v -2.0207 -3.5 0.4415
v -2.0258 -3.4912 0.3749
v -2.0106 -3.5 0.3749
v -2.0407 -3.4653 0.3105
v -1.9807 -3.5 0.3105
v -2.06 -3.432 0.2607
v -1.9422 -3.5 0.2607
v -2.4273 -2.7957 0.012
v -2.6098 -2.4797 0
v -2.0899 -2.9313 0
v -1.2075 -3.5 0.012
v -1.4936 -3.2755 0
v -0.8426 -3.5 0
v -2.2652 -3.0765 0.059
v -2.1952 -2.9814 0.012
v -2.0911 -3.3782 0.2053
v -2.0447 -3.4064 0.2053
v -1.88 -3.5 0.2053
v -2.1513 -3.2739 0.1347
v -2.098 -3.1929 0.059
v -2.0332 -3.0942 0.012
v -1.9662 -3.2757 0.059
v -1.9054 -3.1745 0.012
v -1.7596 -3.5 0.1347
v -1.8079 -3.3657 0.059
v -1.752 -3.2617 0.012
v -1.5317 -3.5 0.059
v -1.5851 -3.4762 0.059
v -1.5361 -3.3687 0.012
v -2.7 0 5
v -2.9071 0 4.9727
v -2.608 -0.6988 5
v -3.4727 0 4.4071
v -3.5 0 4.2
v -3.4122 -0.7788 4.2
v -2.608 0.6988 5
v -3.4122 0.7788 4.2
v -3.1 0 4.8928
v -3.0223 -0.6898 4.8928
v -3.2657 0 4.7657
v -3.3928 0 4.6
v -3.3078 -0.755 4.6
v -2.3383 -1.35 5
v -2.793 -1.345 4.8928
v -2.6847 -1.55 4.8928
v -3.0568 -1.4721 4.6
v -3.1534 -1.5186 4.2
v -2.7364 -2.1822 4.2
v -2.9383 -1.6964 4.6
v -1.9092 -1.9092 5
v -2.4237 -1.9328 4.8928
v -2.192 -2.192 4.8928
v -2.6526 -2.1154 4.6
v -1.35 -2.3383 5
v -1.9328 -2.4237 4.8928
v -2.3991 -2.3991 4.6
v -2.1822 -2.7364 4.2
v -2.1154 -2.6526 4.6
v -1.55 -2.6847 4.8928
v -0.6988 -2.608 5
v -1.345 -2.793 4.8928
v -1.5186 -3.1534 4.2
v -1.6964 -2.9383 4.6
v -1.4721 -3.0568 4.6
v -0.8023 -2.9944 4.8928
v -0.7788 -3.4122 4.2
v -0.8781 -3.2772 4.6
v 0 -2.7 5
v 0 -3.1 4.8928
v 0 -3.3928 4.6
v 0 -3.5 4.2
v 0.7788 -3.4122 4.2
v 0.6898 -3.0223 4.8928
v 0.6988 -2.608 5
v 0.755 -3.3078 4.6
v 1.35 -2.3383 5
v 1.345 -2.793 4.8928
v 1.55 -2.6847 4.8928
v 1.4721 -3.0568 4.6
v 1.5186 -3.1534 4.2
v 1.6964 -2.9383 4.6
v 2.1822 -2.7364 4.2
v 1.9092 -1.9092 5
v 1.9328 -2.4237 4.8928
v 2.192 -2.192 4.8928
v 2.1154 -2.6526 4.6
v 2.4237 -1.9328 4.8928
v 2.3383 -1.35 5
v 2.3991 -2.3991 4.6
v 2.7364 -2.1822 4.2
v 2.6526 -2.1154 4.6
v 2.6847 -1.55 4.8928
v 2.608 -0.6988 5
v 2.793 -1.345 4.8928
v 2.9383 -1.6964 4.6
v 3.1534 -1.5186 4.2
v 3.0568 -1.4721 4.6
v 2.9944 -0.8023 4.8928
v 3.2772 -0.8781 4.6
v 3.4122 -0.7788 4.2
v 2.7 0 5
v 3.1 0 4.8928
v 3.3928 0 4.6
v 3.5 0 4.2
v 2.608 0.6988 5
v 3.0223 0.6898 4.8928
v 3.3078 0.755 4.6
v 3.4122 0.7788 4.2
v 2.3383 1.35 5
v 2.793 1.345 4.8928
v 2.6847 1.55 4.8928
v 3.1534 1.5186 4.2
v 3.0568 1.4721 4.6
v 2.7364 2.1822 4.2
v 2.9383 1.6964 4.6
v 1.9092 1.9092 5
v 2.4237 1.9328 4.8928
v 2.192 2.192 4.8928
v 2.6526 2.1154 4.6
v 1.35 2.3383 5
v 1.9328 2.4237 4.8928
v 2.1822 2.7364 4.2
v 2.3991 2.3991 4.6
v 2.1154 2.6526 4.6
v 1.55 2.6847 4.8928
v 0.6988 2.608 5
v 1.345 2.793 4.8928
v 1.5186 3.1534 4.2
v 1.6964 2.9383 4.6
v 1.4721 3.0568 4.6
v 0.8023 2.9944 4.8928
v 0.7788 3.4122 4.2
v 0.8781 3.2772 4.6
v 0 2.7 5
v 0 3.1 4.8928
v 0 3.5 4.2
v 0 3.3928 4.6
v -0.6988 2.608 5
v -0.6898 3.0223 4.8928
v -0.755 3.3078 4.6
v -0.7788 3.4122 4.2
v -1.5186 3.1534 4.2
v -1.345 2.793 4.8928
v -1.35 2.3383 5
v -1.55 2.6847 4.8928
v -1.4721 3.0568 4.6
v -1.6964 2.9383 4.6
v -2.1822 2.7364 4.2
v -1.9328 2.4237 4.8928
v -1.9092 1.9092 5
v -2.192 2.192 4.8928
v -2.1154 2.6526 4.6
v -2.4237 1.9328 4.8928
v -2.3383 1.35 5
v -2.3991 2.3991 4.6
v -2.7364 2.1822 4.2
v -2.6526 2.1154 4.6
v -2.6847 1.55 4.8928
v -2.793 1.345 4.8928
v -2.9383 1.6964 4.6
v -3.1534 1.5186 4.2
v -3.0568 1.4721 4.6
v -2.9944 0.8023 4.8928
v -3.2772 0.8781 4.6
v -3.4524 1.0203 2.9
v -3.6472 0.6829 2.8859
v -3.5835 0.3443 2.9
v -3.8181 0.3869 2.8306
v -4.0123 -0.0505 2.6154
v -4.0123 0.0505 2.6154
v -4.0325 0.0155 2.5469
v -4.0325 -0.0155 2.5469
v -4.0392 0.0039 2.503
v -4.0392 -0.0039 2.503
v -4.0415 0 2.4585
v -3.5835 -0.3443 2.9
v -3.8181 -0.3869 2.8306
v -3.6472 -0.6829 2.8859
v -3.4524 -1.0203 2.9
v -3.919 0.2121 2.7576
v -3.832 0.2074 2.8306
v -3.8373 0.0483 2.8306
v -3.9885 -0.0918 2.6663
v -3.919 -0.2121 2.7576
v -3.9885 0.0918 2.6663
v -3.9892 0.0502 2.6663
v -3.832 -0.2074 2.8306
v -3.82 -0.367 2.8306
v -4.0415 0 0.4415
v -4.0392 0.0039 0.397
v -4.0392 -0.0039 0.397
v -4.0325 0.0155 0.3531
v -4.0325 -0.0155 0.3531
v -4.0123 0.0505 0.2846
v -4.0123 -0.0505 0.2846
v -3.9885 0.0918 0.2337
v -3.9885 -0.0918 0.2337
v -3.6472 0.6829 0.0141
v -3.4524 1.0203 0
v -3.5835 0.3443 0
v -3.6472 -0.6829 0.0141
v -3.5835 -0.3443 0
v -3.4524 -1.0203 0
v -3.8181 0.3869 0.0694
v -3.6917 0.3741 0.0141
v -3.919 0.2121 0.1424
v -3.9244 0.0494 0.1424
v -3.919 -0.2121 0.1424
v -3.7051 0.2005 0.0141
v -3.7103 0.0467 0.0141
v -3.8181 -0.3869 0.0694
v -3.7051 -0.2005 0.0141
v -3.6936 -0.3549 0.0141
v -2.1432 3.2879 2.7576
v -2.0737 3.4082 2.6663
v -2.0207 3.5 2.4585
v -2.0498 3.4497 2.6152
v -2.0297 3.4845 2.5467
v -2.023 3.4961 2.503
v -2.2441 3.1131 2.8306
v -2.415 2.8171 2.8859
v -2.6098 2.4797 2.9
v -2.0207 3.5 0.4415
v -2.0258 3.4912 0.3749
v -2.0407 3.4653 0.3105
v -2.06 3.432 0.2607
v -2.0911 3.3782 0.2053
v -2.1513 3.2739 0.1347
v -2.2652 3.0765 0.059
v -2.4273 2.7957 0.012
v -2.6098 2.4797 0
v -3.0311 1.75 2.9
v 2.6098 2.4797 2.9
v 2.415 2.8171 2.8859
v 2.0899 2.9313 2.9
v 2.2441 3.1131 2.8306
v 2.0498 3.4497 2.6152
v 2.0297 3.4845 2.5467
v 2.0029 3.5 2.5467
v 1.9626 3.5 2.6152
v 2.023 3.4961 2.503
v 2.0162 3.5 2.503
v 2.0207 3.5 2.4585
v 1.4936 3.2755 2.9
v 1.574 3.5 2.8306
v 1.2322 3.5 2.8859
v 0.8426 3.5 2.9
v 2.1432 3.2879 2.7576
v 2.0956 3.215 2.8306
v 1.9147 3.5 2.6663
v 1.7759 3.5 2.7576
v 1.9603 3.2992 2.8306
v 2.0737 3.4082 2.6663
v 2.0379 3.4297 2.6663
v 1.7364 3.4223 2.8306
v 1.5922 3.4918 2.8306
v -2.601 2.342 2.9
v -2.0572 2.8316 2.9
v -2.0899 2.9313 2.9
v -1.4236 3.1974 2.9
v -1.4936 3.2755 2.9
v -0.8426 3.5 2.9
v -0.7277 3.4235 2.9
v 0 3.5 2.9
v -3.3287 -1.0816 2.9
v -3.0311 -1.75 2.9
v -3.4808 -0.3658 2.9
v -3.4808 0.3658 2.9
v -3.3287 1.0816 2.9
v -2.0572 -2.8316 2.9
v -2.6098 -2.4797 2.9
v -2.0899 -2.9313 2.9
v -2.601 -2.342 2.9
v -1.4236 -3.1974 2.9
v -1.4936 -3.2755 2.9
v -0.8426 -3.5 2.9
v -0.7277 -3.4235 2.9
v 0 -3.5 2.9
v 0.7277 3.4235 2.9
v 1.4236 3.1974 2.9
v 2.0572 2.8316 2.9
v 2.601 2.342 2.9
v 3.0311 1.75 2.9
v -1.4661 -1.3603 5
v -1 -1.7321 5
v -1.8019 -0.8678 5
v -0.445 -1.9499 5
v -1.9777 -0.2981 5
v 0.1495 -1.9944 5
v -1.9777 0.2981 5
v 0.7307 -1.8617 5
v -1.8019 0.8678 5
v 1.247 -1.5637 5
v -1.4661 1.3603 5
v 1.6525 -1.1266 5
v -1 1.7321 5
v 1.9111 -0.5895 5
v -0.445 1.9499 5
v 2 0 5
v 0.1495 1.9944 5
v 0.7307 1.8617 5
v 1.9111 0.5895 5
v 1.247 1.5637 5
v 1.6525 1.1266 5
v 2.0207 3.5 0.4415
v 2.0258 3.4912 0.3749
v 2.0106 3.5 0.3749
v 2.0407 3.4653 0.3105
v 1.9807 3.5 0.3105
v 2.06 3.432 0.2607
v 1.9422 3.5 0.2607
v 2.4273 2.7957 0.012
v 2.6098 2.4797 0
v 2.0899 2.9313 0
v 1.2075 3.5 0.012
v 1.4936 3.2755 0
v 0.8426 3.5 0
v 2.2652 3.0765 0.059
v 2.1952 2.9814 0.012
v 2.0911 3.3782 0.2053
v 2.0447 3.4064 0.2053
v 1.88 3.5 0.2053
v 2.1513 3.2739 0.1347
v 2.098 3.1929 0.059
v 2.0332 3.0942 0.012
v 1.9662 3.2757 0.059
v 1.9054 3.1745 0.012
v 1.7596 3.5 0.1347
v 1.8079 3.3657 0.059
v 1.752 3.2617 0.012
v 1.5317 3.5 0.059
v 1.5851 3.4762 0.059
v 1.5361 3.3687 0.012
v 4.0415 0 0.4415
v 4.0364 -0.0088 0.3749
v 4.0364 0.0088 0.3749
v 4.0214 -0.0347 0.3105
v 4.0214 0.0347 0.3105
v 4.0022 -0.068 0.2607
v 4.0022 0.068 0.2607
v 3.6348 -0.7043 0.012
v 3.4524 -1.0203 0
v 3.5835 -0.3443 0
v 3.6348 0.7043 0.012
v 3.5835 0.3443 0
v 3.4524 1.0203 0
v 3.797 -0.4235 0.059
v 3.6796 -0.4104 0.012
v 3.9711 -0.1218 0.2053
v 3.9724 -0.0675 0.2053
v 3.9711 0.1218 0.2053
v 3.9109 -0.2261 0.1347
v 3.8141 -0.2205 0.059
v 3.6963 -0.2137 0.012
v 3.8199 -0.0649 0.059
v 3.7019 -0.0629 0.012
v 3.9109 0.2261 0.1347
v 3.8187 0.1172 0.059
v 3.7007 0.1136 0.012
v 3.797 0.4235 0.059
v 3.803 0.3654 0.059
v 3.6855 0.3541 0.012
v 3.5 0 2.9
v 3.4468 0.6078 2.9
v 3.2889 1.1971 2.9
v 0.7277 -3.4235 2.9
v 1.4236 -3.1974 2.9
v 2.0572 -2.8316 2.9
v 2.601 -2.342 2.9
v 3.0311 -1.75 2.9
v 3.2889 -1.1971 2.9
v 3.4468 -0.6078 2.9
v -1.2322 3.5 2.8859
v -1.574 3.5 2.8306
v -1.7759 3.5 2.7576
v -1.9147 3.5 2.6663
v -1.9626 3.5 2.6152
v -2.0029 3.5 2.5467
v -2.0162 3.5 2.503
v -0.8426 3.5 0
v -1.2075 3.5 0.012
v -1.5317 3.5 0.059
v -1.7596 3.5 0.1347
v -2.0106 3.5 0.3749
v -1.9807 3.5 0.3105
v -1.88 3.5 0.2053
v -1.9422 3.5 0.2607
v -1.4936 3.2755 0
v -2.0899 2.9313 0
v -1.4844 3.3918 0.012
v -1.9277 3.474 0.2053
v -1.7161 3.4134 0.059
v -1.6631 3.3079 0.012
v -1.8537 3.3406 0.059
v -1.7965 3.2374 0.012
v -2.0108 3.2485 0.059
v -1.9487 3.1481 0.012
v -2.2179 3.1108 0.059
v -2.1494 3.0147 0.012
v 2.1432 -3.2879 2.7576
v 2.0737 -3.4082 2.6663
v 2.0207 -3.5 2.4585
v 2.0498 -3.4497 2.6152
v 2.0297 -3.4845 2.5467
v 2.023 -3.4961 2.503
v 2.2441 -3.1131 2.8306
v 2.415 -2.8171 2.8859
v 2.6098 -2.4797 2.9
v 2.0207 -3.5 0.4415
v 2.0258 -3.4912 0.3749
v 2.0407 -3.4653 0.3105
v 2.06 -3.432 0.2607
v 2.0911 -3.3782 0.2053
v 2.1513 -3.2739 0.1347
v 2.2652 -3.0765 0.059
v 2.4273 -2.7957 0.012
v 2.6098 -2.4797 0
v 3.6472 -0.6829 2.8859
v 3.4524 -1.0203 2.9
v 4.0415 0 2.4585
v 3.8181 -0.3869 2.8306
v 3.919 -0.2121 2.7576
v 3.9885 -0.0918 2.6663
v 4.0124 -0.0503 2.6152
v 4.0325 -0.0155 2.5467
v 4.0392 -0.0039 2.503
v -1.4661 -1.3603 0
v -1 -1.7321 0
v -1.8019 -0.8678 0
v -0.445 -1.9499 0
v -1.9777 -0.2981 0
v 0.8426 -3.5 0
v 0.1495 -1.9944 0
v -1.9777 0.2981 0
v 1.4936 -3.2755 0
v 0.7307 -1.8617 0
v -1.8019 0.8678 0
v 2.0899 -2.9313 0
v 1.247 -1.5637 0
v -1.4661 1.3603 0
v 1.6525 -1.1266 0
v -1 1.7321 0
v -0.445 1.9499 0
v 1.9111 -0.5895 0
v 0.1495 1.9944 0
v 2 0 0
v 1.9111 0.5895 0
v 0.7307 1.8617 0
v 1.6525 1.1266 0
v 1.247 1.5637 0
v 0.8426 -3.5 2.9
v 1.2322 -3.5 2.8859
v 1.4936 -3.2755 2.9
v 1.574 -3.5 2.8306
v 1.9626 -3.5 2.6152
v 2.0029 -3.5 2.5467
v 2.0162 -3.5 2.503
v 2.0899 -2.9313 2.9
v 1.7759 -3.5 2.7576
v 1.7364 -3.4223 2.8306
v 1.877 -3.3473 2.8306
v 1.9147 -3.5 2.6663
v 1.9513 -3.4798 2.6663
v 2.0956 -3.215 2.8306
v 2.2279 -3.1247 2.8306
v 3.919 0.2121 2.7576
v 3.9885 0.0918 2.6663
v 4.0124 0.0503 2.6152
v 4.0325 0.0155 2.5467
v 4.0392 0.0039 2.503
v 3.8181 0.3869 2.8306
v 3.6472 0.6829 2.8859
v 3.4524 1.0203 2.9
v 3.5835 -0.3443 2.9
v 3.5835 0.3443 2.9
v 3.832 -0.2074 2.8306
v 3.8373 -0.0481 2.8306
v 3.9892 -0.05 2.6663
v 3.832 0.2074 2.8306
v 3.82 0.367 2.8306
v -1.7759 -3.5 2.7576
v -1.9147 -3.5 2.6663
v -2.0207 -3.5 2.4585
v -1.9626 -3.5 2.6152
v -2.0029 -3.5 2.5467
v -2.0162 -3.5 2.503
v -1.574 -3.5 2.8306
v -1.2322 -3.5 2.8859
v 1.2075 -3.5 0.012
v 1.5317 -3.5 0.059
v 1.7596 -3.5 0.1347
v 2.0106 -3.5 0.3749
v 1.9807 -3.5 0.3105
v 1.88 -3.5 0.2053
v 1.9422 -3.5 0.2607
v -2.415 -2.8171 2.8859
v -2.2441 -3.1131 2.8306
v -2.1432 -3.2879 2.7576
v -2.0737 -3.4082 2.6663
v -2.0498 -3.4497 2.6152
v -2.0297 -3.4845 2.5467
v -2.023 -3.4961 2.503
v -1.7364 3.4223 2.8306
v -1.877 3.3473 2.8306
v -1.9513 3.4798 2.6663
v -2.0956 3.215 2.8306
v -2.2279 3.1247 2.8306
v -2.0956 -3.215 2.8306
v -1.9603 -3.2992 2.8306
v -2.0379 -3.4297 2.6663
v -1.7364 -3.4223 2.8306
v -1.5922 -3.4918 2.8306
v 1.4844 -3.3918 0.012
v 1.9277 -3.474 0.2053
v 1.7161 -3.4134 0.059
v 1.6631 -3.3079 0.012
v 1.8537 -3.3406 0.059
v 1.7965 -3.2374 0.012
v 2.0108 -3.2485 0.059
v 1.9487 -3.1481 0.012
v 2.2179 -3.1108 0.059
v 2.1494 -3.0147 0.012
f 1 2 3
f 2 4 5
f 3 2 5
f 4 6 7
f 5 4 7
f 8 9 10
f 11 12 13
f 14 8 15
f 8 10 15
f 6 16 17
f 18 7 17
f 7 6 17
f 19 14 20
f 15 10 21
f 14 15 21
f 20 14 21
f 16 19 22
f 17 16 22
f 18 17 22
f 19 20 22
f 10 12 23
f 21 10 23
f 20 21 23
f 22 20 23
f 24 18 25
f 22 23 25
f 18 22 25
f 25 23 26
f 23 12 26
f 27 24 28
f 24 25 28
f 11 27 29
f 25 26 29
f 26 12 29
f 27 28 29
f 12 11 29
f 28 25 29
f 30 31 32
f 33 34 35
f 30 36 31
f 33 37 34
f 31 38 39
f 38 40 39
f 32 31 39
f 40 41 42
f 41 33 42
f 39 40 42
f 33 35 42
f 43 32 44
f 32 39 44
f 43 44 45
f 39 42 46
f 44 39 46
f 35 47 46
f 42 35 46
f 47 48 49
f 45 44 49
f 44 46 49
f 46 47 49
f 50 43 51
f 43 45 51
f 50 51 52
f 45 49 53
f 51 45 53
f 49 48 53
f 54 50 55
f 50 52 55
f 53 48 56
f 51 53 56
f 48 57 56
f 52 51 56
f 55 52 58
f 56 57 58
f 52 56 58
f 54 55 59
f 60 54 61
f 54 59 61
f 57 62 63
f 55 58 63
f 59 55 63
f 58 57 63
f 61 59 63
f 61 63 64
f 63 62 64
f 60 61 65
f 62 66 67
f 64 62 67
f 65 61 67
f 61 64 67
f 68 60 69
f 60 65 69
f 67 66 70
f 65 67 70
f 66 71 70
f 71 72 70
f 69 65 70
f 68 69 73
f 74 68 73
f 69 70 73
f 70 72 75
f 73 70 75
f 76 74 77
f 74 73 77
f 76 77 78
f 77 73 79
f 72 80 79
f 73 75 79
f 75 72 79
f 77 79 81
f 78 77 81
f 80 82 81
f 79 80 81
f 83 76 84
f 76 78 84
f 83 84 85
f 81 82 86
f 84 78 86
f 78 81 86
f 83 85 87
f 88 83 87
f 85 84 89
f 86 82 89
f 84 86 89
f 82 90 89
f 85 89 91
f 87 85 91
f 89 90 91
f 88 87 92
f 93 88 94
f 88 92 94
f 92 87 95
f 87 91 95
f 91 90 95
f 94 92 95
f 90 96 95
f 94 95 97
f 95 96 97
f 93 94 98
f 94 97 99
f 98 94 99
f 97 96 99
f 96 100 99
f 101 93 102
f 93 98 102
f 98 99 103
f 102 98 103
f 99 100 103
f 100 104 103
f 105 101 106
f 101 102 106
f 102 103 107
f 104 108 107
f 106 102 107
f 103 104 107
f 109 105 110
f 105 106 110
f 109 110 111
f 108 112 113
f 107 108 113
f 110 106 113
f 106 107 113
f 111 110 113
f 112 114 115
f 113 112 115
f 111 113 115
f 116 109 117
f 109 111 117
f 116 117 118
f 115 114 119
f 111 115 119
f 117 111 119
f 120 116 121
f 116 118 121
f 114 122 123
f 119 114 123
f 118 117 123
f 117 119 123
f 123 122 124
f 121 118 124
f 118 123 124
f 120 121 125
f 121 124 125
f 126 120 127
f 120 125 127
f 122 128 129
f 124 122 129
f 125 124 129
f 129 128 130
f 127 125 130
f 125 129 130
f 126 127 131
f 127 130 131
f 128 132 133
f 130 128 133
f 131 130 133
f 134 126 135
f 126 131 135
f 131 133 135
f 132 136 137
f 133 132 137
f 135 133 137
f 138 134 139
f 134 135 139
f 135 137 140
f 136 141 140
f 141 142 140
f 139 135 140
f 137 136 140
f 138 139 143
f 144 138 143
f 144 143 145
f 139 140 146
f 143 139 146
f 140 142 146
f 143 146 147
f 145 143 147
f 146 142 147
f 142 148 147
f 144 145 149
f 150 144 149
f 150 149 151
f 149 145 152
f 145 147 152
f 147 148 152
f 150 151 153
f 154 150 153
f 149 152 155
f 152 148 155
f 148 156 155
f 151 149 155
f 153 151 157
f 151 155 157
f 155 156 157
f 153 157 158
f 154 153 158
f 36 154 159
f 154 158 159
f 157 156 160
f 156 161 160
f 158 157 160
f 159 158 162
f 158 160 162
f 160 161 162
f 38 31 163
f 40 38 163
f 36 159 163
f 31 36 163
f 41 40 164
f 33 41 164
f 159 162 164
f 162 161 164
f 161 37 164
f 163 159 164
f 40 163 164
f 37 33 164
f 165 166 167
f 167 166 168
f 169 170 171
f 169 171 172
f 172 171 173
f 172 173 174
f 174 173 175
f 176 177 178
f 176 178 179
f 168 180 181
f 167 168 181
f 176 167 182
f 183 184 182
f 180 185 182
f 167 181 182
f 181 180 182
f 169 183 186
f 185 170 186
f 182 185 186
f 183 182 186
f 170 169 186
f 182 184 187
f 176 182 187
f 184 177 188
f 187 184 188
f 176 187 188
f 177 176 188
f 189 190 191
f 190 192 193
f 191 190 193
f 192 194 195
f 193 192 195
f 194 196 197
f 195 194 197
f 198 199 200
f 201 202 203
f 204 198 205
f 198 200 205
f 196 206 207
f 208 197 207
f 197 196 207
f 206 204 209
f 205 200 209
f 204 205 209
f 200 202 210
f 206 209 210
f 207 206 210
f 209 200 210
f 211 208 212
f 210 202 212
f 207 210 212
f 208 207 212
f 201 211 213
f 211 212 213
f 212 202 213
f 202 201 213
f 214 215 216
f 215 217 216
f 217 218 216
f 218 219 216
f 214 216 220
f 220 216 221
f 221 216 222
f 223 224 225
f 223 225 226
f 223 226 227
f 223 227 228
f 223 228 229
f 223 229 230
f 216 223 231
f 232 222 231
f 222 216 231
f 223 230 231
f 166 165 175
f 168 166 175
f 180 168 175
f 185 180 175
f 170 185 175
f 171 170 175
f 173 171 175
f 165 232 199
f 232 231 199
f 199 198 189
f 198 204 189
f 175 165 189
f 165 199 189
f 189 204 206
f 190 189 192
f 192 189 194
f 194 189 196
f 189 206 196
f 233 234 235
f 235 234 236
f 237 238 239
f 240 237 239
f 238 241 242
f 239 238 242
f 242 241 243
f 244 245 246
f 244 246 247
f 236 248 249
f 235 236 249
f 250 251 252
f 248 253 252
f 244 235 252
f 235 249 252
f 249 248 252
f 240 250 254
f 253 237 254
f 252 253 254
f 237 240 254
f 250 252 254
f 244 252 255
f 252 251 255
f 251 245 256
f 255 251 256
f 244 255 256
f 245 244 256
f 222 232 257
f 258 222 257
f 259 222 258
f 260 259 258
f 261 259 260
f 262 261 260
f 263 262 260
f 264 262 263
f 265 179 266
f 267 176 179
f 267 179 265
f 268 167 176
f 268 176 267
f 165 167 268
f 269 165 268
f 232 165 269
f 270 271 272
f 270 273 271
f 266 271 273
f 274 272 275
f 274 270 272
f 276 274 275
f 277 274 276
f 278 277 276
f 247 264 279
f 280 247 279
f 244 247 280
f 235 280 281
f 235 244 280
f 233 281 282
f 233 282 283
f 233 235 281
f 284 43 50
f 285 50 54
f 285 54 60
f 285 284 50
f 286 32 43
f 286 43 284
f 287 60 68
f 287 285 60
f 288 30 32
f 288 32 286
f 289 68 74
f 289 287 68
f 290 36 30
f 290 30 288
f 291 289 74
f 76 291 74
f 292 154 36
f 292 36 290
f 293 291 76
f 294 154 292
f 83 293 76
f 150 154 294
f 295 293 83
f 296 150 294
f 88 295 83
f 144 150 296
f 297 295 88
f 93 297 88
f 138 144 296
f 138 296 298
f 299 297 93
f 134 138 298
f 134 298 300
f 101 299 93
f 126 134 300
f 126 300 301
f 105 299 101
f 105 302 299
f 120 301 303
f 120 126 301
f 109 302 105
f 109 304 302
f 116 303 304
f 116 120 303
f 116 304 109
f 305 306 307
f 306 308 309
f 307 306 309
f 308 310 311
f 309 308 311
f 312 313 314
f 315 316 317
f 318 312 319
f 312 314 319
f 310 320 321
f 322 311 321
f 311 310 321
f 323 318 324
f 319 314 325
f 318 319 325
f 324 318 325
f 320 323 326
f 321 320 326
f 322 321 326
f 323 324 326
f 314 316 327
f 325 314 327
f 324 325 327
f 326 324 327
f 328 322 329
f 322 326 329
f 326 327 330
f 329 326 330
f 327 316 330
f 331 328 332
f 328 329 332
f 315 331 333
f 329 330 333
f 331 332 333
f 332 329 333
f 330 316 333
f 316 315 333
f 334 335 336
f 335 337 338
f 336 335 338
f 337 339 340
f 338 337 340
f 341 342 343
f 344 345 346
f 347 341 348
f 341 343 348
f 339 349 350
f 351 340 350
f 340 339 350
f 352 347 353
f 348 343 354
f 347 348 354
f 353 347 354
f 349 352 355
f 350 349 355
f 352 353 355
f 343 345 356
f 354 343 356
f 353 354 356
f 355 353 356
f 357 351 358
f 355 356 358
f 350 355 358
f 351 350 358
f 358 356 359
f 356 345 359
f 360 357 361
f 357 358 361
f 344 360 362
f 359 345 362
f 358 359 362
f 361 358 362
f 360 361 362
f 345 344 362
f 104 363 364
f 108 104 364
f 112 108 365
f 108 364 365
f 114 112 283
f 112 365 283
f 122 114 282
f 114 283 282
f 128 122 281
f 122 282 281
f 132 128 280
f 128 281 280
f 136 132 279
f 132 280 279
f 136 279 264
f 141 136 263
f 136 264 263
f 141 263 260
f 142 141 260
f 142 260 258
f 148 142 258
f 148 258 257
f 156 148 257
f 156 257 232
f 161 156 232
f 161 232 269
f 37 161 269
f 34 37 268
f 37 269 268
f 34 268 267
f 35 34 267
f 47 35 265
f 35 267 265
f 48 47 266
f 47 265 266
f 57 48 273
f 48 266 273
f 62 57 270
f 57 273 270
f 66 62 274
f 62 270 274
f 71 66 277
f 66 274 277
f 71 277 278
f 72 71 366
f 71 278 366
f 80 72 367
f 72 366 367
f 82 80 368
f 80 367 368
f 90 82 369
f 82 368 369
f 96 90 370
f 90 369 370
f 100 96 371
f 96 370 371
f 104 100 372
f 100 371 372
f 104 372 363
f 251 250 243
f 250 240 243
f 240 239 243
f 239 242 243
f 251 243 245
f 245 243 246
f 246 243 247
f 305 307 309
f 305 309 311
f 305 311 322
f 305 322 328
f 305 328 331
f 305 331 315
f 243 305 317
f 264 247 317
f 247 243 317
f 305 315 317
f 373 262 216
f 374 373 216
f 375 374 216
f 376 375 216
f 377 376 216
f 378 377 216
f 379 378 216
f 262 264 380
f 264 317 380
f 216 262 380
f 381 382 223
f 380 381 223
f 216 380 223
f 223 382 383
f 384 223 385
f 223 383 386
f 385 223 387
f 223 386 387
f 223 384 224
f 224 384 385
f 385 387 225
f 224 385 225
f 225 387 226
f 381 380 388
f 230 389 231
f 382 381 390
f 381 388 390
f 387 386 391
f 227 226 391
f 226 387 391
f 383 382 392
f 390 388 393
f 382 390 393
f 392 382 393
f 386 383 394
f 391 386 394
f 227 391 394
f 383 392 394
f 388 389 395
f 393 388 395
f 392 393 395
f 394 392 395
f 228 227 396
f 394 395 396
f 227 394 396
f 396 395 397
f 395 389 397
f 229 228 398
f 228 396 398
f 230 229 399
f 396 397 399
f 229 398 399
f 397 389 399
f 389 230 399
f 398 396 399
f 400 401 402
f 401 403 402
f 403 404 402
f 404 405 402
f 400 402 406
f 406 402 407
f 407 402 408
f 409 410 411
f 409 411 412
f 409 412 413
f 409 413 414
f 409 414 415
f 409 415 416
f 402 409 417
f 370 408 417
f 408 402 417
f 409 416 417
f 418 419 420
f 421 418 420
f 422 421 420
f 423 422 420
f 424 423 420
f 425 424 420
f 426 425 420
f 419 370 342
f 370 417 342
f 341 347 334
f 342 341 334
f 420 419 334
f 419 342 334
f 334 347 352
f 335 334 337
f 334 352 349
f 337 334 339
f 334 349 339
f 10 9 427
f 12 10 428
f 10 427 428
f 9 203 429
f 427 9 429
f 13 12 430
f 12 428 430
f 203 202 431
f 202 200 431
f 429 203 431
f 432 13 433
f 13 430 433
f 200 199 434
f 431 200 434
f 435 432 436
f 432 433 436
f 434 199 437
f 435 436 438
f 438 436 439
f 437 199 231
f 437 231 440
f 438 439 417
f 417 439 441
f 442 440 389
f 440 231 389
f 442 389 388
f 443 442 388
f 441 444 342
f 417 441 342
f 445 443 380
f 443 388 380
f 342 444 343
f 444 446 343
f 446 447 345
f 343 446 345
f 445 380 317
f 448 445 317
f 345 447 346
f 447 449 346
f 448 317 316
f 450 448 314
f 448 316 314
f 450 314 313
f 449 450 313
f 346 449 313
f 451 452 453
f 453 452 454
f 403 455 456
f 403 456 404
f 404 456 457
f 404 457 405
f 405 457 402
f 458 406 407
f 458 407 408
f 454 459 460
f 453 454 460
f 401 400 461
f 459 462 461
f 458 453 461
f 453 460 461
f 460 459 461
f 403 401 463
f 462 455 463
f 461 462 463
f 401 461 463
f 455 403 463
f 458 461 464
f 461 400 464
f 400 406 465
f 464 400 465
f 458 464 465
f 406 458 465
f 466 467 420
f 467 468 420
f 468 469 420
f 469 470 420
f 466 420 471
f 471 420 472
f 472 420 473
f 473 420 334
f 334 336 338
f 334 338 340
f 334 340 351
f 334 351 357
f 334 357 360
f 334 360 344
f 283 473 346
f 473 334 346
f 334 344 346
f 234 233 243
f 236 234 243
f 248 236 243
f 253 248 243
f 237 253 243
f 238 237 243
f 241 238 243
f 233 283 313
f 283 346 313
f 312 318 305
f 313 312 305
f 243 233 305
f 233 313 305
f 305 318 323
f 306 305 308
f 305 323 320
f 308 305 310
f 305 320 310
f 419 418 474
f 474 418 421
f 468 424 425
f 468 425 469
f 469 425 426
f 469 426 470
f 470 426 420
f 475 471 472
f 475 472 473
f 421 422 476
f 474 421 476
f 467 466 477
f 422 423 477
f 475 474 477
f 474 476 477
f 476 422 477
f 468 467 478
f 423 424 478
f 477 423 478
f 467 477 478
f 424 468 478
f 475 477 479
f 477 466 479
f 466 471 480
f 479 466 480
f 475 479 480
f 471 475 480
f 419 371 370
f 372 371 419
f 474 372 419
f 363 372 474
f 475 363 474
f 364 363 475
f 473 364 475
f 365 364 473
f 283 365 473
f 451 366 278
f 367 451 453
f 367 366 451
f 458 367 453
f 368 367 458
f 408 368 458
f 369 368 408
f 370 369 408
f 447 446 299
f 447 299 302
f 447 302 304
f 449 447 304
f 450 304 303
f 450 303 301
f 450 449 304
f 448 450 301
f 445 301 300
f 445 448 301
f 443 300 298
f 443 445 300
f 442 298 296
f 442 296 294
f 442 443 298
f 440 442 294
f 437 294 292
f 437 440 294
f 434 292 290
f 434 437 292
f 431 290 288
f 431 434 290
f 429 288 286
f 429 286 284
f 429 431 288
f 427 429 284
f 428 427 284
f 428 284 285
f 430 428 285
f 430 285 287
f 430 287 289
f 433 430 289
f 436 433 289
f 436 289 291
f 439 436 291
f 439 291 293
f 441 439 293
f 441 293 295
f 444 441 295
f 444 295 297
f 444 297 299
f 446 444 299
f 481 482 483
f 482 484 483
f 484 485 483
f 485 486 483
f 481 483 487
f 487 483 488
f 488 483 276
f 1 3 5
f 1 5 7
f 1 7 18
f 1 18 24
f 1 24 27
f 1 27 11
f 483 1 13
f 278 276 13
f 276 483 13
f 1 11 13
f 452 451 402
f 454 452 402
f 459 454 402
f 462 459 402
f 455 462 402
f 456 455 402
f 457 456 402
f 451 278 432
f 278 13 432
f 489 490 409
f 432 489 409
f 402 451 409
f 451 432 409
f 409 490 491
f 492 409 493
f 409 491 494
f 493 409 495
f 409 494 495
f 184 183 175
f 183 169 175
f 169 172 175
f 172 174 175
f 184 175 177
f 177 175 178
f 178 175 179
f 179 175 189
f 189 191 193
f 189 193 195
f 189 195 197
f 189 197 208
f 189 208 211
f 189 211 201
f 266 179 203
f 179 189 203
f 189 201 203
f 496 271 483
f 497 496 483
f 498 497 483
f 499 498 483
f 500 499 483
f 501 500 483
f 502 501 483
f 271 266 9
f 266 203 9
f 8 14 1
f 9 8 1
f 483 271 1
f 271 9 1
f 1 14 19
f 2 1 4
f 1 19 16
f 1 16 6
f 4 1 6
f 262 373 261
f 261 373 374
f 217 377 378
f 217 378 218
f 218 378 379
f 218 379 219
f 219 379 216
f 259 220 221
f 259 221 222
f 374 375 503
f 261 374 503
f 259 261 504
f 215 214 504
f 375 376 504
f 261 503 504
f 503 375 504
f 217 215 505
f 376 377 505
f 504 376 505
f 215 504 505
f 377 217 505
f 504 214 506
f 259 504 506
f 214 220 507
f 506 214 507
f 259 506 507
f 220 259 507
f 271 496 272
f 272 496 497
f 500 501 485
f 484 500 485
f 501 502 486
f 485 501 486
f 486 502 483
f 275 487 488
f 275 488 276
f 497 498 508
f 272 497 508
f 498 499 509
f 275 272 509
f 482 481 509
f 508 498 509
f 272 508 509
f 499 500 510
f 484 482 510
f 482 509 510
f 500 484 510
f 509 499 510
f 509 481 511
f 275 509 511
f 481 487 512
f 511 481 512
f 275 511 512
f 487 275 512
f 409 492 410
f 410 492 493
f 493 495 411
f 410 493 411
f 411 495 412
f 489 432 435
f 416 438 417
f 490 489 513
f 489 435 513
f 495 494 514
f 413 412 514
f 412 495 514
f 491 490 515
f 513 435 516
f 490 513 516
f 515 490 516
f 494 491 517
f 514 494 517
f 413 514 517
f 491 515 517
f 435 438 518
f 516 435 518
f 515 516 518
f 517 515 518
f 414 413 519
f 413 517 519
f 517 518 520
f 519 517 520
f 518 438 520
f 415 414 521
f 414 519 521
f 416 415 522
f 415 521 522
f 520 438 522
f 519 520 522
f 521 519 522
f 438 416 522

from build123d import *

# Parameters (mm, degrees)
SZKIC1_R                    = 2
DODANIE_WYCI_GNI_CIE1_DEPTH = 2.9
SZKIC2_R                    = 3.5
SZKIC2_R_2                  = 2
DODANIE_WYCI_GNI_CIE2_DEPTH = 5


with BuildPart() as part:
    # Szkic1 → Dodanie-wyciągnięcie1 (new body)
    with BuildSketch(Plane.XY):
        Polygon((-4.041451884, 0), (-2.020725942, -3.5), (2.020725942, -3.5), (4.041451884, 0), (2.020725942, 3.5), (-2.020725942, 3.5), align=None)
        Circle(SZKIC1_R, mode=Mode.SUBTRACT)
    extrude(amount=DODANIE_WYCI_GNI_CIE1_DEPTH)

    # Szkic2 → Dodanie-wyciągnięcie2 (add)
    with BuildSketch(Plane.XY):
        Circle(SZKIC2_R)
        Circle(SZKIC2_R_2, mode=Mode.SUBTRACT)
    extrude(amount=DODANIE_WYCI_GNI_CIE2_DEPTH)

    # Szkic3 → Wycięcie-obrót1 (revolve, cut)
    with BuildSketch(Plane(origin=(0, 0, 0), x_dir=(1, 0, 0), z_dir=(0, 1, 0))):
        with BuildLine():
            Line((-4.041451884, 0), (-4.041451884, -0.441451884))
            ThreePointArc((-4.041451884, -0.441451884), (-3.912153621, -0.129298263), (-3.6, 0))
            Line((-3.6, 0), (-4.041451884, 0))
        make_face()
        with BuildLine():
            ThreePointArc((-3.6, -2.9), (-3.912153621, -2.770701737), (-4.041451884, -2.458548116))
            Line((-4.041451884, -2.458548116), (-4.041451884, -2.9))
            Line((-4.041451884, -2.9), (-3.6, -2.9))
        make_face()
        with BuildLine():
            Line((-3.5, -5), (-2.7, -5))
            ThreePointArc((-2.7, -5), (-3.265685425, -4.765685425), (-3.5, -4.2))
            Line((-3.5, -4.2), (-3.5, -5))
        make_face()
    revolve(axis=Axis((0, 0, -1.701574894), (0, 0, 1)), mode=Mode.SUBTRACT)


solid = part.part
